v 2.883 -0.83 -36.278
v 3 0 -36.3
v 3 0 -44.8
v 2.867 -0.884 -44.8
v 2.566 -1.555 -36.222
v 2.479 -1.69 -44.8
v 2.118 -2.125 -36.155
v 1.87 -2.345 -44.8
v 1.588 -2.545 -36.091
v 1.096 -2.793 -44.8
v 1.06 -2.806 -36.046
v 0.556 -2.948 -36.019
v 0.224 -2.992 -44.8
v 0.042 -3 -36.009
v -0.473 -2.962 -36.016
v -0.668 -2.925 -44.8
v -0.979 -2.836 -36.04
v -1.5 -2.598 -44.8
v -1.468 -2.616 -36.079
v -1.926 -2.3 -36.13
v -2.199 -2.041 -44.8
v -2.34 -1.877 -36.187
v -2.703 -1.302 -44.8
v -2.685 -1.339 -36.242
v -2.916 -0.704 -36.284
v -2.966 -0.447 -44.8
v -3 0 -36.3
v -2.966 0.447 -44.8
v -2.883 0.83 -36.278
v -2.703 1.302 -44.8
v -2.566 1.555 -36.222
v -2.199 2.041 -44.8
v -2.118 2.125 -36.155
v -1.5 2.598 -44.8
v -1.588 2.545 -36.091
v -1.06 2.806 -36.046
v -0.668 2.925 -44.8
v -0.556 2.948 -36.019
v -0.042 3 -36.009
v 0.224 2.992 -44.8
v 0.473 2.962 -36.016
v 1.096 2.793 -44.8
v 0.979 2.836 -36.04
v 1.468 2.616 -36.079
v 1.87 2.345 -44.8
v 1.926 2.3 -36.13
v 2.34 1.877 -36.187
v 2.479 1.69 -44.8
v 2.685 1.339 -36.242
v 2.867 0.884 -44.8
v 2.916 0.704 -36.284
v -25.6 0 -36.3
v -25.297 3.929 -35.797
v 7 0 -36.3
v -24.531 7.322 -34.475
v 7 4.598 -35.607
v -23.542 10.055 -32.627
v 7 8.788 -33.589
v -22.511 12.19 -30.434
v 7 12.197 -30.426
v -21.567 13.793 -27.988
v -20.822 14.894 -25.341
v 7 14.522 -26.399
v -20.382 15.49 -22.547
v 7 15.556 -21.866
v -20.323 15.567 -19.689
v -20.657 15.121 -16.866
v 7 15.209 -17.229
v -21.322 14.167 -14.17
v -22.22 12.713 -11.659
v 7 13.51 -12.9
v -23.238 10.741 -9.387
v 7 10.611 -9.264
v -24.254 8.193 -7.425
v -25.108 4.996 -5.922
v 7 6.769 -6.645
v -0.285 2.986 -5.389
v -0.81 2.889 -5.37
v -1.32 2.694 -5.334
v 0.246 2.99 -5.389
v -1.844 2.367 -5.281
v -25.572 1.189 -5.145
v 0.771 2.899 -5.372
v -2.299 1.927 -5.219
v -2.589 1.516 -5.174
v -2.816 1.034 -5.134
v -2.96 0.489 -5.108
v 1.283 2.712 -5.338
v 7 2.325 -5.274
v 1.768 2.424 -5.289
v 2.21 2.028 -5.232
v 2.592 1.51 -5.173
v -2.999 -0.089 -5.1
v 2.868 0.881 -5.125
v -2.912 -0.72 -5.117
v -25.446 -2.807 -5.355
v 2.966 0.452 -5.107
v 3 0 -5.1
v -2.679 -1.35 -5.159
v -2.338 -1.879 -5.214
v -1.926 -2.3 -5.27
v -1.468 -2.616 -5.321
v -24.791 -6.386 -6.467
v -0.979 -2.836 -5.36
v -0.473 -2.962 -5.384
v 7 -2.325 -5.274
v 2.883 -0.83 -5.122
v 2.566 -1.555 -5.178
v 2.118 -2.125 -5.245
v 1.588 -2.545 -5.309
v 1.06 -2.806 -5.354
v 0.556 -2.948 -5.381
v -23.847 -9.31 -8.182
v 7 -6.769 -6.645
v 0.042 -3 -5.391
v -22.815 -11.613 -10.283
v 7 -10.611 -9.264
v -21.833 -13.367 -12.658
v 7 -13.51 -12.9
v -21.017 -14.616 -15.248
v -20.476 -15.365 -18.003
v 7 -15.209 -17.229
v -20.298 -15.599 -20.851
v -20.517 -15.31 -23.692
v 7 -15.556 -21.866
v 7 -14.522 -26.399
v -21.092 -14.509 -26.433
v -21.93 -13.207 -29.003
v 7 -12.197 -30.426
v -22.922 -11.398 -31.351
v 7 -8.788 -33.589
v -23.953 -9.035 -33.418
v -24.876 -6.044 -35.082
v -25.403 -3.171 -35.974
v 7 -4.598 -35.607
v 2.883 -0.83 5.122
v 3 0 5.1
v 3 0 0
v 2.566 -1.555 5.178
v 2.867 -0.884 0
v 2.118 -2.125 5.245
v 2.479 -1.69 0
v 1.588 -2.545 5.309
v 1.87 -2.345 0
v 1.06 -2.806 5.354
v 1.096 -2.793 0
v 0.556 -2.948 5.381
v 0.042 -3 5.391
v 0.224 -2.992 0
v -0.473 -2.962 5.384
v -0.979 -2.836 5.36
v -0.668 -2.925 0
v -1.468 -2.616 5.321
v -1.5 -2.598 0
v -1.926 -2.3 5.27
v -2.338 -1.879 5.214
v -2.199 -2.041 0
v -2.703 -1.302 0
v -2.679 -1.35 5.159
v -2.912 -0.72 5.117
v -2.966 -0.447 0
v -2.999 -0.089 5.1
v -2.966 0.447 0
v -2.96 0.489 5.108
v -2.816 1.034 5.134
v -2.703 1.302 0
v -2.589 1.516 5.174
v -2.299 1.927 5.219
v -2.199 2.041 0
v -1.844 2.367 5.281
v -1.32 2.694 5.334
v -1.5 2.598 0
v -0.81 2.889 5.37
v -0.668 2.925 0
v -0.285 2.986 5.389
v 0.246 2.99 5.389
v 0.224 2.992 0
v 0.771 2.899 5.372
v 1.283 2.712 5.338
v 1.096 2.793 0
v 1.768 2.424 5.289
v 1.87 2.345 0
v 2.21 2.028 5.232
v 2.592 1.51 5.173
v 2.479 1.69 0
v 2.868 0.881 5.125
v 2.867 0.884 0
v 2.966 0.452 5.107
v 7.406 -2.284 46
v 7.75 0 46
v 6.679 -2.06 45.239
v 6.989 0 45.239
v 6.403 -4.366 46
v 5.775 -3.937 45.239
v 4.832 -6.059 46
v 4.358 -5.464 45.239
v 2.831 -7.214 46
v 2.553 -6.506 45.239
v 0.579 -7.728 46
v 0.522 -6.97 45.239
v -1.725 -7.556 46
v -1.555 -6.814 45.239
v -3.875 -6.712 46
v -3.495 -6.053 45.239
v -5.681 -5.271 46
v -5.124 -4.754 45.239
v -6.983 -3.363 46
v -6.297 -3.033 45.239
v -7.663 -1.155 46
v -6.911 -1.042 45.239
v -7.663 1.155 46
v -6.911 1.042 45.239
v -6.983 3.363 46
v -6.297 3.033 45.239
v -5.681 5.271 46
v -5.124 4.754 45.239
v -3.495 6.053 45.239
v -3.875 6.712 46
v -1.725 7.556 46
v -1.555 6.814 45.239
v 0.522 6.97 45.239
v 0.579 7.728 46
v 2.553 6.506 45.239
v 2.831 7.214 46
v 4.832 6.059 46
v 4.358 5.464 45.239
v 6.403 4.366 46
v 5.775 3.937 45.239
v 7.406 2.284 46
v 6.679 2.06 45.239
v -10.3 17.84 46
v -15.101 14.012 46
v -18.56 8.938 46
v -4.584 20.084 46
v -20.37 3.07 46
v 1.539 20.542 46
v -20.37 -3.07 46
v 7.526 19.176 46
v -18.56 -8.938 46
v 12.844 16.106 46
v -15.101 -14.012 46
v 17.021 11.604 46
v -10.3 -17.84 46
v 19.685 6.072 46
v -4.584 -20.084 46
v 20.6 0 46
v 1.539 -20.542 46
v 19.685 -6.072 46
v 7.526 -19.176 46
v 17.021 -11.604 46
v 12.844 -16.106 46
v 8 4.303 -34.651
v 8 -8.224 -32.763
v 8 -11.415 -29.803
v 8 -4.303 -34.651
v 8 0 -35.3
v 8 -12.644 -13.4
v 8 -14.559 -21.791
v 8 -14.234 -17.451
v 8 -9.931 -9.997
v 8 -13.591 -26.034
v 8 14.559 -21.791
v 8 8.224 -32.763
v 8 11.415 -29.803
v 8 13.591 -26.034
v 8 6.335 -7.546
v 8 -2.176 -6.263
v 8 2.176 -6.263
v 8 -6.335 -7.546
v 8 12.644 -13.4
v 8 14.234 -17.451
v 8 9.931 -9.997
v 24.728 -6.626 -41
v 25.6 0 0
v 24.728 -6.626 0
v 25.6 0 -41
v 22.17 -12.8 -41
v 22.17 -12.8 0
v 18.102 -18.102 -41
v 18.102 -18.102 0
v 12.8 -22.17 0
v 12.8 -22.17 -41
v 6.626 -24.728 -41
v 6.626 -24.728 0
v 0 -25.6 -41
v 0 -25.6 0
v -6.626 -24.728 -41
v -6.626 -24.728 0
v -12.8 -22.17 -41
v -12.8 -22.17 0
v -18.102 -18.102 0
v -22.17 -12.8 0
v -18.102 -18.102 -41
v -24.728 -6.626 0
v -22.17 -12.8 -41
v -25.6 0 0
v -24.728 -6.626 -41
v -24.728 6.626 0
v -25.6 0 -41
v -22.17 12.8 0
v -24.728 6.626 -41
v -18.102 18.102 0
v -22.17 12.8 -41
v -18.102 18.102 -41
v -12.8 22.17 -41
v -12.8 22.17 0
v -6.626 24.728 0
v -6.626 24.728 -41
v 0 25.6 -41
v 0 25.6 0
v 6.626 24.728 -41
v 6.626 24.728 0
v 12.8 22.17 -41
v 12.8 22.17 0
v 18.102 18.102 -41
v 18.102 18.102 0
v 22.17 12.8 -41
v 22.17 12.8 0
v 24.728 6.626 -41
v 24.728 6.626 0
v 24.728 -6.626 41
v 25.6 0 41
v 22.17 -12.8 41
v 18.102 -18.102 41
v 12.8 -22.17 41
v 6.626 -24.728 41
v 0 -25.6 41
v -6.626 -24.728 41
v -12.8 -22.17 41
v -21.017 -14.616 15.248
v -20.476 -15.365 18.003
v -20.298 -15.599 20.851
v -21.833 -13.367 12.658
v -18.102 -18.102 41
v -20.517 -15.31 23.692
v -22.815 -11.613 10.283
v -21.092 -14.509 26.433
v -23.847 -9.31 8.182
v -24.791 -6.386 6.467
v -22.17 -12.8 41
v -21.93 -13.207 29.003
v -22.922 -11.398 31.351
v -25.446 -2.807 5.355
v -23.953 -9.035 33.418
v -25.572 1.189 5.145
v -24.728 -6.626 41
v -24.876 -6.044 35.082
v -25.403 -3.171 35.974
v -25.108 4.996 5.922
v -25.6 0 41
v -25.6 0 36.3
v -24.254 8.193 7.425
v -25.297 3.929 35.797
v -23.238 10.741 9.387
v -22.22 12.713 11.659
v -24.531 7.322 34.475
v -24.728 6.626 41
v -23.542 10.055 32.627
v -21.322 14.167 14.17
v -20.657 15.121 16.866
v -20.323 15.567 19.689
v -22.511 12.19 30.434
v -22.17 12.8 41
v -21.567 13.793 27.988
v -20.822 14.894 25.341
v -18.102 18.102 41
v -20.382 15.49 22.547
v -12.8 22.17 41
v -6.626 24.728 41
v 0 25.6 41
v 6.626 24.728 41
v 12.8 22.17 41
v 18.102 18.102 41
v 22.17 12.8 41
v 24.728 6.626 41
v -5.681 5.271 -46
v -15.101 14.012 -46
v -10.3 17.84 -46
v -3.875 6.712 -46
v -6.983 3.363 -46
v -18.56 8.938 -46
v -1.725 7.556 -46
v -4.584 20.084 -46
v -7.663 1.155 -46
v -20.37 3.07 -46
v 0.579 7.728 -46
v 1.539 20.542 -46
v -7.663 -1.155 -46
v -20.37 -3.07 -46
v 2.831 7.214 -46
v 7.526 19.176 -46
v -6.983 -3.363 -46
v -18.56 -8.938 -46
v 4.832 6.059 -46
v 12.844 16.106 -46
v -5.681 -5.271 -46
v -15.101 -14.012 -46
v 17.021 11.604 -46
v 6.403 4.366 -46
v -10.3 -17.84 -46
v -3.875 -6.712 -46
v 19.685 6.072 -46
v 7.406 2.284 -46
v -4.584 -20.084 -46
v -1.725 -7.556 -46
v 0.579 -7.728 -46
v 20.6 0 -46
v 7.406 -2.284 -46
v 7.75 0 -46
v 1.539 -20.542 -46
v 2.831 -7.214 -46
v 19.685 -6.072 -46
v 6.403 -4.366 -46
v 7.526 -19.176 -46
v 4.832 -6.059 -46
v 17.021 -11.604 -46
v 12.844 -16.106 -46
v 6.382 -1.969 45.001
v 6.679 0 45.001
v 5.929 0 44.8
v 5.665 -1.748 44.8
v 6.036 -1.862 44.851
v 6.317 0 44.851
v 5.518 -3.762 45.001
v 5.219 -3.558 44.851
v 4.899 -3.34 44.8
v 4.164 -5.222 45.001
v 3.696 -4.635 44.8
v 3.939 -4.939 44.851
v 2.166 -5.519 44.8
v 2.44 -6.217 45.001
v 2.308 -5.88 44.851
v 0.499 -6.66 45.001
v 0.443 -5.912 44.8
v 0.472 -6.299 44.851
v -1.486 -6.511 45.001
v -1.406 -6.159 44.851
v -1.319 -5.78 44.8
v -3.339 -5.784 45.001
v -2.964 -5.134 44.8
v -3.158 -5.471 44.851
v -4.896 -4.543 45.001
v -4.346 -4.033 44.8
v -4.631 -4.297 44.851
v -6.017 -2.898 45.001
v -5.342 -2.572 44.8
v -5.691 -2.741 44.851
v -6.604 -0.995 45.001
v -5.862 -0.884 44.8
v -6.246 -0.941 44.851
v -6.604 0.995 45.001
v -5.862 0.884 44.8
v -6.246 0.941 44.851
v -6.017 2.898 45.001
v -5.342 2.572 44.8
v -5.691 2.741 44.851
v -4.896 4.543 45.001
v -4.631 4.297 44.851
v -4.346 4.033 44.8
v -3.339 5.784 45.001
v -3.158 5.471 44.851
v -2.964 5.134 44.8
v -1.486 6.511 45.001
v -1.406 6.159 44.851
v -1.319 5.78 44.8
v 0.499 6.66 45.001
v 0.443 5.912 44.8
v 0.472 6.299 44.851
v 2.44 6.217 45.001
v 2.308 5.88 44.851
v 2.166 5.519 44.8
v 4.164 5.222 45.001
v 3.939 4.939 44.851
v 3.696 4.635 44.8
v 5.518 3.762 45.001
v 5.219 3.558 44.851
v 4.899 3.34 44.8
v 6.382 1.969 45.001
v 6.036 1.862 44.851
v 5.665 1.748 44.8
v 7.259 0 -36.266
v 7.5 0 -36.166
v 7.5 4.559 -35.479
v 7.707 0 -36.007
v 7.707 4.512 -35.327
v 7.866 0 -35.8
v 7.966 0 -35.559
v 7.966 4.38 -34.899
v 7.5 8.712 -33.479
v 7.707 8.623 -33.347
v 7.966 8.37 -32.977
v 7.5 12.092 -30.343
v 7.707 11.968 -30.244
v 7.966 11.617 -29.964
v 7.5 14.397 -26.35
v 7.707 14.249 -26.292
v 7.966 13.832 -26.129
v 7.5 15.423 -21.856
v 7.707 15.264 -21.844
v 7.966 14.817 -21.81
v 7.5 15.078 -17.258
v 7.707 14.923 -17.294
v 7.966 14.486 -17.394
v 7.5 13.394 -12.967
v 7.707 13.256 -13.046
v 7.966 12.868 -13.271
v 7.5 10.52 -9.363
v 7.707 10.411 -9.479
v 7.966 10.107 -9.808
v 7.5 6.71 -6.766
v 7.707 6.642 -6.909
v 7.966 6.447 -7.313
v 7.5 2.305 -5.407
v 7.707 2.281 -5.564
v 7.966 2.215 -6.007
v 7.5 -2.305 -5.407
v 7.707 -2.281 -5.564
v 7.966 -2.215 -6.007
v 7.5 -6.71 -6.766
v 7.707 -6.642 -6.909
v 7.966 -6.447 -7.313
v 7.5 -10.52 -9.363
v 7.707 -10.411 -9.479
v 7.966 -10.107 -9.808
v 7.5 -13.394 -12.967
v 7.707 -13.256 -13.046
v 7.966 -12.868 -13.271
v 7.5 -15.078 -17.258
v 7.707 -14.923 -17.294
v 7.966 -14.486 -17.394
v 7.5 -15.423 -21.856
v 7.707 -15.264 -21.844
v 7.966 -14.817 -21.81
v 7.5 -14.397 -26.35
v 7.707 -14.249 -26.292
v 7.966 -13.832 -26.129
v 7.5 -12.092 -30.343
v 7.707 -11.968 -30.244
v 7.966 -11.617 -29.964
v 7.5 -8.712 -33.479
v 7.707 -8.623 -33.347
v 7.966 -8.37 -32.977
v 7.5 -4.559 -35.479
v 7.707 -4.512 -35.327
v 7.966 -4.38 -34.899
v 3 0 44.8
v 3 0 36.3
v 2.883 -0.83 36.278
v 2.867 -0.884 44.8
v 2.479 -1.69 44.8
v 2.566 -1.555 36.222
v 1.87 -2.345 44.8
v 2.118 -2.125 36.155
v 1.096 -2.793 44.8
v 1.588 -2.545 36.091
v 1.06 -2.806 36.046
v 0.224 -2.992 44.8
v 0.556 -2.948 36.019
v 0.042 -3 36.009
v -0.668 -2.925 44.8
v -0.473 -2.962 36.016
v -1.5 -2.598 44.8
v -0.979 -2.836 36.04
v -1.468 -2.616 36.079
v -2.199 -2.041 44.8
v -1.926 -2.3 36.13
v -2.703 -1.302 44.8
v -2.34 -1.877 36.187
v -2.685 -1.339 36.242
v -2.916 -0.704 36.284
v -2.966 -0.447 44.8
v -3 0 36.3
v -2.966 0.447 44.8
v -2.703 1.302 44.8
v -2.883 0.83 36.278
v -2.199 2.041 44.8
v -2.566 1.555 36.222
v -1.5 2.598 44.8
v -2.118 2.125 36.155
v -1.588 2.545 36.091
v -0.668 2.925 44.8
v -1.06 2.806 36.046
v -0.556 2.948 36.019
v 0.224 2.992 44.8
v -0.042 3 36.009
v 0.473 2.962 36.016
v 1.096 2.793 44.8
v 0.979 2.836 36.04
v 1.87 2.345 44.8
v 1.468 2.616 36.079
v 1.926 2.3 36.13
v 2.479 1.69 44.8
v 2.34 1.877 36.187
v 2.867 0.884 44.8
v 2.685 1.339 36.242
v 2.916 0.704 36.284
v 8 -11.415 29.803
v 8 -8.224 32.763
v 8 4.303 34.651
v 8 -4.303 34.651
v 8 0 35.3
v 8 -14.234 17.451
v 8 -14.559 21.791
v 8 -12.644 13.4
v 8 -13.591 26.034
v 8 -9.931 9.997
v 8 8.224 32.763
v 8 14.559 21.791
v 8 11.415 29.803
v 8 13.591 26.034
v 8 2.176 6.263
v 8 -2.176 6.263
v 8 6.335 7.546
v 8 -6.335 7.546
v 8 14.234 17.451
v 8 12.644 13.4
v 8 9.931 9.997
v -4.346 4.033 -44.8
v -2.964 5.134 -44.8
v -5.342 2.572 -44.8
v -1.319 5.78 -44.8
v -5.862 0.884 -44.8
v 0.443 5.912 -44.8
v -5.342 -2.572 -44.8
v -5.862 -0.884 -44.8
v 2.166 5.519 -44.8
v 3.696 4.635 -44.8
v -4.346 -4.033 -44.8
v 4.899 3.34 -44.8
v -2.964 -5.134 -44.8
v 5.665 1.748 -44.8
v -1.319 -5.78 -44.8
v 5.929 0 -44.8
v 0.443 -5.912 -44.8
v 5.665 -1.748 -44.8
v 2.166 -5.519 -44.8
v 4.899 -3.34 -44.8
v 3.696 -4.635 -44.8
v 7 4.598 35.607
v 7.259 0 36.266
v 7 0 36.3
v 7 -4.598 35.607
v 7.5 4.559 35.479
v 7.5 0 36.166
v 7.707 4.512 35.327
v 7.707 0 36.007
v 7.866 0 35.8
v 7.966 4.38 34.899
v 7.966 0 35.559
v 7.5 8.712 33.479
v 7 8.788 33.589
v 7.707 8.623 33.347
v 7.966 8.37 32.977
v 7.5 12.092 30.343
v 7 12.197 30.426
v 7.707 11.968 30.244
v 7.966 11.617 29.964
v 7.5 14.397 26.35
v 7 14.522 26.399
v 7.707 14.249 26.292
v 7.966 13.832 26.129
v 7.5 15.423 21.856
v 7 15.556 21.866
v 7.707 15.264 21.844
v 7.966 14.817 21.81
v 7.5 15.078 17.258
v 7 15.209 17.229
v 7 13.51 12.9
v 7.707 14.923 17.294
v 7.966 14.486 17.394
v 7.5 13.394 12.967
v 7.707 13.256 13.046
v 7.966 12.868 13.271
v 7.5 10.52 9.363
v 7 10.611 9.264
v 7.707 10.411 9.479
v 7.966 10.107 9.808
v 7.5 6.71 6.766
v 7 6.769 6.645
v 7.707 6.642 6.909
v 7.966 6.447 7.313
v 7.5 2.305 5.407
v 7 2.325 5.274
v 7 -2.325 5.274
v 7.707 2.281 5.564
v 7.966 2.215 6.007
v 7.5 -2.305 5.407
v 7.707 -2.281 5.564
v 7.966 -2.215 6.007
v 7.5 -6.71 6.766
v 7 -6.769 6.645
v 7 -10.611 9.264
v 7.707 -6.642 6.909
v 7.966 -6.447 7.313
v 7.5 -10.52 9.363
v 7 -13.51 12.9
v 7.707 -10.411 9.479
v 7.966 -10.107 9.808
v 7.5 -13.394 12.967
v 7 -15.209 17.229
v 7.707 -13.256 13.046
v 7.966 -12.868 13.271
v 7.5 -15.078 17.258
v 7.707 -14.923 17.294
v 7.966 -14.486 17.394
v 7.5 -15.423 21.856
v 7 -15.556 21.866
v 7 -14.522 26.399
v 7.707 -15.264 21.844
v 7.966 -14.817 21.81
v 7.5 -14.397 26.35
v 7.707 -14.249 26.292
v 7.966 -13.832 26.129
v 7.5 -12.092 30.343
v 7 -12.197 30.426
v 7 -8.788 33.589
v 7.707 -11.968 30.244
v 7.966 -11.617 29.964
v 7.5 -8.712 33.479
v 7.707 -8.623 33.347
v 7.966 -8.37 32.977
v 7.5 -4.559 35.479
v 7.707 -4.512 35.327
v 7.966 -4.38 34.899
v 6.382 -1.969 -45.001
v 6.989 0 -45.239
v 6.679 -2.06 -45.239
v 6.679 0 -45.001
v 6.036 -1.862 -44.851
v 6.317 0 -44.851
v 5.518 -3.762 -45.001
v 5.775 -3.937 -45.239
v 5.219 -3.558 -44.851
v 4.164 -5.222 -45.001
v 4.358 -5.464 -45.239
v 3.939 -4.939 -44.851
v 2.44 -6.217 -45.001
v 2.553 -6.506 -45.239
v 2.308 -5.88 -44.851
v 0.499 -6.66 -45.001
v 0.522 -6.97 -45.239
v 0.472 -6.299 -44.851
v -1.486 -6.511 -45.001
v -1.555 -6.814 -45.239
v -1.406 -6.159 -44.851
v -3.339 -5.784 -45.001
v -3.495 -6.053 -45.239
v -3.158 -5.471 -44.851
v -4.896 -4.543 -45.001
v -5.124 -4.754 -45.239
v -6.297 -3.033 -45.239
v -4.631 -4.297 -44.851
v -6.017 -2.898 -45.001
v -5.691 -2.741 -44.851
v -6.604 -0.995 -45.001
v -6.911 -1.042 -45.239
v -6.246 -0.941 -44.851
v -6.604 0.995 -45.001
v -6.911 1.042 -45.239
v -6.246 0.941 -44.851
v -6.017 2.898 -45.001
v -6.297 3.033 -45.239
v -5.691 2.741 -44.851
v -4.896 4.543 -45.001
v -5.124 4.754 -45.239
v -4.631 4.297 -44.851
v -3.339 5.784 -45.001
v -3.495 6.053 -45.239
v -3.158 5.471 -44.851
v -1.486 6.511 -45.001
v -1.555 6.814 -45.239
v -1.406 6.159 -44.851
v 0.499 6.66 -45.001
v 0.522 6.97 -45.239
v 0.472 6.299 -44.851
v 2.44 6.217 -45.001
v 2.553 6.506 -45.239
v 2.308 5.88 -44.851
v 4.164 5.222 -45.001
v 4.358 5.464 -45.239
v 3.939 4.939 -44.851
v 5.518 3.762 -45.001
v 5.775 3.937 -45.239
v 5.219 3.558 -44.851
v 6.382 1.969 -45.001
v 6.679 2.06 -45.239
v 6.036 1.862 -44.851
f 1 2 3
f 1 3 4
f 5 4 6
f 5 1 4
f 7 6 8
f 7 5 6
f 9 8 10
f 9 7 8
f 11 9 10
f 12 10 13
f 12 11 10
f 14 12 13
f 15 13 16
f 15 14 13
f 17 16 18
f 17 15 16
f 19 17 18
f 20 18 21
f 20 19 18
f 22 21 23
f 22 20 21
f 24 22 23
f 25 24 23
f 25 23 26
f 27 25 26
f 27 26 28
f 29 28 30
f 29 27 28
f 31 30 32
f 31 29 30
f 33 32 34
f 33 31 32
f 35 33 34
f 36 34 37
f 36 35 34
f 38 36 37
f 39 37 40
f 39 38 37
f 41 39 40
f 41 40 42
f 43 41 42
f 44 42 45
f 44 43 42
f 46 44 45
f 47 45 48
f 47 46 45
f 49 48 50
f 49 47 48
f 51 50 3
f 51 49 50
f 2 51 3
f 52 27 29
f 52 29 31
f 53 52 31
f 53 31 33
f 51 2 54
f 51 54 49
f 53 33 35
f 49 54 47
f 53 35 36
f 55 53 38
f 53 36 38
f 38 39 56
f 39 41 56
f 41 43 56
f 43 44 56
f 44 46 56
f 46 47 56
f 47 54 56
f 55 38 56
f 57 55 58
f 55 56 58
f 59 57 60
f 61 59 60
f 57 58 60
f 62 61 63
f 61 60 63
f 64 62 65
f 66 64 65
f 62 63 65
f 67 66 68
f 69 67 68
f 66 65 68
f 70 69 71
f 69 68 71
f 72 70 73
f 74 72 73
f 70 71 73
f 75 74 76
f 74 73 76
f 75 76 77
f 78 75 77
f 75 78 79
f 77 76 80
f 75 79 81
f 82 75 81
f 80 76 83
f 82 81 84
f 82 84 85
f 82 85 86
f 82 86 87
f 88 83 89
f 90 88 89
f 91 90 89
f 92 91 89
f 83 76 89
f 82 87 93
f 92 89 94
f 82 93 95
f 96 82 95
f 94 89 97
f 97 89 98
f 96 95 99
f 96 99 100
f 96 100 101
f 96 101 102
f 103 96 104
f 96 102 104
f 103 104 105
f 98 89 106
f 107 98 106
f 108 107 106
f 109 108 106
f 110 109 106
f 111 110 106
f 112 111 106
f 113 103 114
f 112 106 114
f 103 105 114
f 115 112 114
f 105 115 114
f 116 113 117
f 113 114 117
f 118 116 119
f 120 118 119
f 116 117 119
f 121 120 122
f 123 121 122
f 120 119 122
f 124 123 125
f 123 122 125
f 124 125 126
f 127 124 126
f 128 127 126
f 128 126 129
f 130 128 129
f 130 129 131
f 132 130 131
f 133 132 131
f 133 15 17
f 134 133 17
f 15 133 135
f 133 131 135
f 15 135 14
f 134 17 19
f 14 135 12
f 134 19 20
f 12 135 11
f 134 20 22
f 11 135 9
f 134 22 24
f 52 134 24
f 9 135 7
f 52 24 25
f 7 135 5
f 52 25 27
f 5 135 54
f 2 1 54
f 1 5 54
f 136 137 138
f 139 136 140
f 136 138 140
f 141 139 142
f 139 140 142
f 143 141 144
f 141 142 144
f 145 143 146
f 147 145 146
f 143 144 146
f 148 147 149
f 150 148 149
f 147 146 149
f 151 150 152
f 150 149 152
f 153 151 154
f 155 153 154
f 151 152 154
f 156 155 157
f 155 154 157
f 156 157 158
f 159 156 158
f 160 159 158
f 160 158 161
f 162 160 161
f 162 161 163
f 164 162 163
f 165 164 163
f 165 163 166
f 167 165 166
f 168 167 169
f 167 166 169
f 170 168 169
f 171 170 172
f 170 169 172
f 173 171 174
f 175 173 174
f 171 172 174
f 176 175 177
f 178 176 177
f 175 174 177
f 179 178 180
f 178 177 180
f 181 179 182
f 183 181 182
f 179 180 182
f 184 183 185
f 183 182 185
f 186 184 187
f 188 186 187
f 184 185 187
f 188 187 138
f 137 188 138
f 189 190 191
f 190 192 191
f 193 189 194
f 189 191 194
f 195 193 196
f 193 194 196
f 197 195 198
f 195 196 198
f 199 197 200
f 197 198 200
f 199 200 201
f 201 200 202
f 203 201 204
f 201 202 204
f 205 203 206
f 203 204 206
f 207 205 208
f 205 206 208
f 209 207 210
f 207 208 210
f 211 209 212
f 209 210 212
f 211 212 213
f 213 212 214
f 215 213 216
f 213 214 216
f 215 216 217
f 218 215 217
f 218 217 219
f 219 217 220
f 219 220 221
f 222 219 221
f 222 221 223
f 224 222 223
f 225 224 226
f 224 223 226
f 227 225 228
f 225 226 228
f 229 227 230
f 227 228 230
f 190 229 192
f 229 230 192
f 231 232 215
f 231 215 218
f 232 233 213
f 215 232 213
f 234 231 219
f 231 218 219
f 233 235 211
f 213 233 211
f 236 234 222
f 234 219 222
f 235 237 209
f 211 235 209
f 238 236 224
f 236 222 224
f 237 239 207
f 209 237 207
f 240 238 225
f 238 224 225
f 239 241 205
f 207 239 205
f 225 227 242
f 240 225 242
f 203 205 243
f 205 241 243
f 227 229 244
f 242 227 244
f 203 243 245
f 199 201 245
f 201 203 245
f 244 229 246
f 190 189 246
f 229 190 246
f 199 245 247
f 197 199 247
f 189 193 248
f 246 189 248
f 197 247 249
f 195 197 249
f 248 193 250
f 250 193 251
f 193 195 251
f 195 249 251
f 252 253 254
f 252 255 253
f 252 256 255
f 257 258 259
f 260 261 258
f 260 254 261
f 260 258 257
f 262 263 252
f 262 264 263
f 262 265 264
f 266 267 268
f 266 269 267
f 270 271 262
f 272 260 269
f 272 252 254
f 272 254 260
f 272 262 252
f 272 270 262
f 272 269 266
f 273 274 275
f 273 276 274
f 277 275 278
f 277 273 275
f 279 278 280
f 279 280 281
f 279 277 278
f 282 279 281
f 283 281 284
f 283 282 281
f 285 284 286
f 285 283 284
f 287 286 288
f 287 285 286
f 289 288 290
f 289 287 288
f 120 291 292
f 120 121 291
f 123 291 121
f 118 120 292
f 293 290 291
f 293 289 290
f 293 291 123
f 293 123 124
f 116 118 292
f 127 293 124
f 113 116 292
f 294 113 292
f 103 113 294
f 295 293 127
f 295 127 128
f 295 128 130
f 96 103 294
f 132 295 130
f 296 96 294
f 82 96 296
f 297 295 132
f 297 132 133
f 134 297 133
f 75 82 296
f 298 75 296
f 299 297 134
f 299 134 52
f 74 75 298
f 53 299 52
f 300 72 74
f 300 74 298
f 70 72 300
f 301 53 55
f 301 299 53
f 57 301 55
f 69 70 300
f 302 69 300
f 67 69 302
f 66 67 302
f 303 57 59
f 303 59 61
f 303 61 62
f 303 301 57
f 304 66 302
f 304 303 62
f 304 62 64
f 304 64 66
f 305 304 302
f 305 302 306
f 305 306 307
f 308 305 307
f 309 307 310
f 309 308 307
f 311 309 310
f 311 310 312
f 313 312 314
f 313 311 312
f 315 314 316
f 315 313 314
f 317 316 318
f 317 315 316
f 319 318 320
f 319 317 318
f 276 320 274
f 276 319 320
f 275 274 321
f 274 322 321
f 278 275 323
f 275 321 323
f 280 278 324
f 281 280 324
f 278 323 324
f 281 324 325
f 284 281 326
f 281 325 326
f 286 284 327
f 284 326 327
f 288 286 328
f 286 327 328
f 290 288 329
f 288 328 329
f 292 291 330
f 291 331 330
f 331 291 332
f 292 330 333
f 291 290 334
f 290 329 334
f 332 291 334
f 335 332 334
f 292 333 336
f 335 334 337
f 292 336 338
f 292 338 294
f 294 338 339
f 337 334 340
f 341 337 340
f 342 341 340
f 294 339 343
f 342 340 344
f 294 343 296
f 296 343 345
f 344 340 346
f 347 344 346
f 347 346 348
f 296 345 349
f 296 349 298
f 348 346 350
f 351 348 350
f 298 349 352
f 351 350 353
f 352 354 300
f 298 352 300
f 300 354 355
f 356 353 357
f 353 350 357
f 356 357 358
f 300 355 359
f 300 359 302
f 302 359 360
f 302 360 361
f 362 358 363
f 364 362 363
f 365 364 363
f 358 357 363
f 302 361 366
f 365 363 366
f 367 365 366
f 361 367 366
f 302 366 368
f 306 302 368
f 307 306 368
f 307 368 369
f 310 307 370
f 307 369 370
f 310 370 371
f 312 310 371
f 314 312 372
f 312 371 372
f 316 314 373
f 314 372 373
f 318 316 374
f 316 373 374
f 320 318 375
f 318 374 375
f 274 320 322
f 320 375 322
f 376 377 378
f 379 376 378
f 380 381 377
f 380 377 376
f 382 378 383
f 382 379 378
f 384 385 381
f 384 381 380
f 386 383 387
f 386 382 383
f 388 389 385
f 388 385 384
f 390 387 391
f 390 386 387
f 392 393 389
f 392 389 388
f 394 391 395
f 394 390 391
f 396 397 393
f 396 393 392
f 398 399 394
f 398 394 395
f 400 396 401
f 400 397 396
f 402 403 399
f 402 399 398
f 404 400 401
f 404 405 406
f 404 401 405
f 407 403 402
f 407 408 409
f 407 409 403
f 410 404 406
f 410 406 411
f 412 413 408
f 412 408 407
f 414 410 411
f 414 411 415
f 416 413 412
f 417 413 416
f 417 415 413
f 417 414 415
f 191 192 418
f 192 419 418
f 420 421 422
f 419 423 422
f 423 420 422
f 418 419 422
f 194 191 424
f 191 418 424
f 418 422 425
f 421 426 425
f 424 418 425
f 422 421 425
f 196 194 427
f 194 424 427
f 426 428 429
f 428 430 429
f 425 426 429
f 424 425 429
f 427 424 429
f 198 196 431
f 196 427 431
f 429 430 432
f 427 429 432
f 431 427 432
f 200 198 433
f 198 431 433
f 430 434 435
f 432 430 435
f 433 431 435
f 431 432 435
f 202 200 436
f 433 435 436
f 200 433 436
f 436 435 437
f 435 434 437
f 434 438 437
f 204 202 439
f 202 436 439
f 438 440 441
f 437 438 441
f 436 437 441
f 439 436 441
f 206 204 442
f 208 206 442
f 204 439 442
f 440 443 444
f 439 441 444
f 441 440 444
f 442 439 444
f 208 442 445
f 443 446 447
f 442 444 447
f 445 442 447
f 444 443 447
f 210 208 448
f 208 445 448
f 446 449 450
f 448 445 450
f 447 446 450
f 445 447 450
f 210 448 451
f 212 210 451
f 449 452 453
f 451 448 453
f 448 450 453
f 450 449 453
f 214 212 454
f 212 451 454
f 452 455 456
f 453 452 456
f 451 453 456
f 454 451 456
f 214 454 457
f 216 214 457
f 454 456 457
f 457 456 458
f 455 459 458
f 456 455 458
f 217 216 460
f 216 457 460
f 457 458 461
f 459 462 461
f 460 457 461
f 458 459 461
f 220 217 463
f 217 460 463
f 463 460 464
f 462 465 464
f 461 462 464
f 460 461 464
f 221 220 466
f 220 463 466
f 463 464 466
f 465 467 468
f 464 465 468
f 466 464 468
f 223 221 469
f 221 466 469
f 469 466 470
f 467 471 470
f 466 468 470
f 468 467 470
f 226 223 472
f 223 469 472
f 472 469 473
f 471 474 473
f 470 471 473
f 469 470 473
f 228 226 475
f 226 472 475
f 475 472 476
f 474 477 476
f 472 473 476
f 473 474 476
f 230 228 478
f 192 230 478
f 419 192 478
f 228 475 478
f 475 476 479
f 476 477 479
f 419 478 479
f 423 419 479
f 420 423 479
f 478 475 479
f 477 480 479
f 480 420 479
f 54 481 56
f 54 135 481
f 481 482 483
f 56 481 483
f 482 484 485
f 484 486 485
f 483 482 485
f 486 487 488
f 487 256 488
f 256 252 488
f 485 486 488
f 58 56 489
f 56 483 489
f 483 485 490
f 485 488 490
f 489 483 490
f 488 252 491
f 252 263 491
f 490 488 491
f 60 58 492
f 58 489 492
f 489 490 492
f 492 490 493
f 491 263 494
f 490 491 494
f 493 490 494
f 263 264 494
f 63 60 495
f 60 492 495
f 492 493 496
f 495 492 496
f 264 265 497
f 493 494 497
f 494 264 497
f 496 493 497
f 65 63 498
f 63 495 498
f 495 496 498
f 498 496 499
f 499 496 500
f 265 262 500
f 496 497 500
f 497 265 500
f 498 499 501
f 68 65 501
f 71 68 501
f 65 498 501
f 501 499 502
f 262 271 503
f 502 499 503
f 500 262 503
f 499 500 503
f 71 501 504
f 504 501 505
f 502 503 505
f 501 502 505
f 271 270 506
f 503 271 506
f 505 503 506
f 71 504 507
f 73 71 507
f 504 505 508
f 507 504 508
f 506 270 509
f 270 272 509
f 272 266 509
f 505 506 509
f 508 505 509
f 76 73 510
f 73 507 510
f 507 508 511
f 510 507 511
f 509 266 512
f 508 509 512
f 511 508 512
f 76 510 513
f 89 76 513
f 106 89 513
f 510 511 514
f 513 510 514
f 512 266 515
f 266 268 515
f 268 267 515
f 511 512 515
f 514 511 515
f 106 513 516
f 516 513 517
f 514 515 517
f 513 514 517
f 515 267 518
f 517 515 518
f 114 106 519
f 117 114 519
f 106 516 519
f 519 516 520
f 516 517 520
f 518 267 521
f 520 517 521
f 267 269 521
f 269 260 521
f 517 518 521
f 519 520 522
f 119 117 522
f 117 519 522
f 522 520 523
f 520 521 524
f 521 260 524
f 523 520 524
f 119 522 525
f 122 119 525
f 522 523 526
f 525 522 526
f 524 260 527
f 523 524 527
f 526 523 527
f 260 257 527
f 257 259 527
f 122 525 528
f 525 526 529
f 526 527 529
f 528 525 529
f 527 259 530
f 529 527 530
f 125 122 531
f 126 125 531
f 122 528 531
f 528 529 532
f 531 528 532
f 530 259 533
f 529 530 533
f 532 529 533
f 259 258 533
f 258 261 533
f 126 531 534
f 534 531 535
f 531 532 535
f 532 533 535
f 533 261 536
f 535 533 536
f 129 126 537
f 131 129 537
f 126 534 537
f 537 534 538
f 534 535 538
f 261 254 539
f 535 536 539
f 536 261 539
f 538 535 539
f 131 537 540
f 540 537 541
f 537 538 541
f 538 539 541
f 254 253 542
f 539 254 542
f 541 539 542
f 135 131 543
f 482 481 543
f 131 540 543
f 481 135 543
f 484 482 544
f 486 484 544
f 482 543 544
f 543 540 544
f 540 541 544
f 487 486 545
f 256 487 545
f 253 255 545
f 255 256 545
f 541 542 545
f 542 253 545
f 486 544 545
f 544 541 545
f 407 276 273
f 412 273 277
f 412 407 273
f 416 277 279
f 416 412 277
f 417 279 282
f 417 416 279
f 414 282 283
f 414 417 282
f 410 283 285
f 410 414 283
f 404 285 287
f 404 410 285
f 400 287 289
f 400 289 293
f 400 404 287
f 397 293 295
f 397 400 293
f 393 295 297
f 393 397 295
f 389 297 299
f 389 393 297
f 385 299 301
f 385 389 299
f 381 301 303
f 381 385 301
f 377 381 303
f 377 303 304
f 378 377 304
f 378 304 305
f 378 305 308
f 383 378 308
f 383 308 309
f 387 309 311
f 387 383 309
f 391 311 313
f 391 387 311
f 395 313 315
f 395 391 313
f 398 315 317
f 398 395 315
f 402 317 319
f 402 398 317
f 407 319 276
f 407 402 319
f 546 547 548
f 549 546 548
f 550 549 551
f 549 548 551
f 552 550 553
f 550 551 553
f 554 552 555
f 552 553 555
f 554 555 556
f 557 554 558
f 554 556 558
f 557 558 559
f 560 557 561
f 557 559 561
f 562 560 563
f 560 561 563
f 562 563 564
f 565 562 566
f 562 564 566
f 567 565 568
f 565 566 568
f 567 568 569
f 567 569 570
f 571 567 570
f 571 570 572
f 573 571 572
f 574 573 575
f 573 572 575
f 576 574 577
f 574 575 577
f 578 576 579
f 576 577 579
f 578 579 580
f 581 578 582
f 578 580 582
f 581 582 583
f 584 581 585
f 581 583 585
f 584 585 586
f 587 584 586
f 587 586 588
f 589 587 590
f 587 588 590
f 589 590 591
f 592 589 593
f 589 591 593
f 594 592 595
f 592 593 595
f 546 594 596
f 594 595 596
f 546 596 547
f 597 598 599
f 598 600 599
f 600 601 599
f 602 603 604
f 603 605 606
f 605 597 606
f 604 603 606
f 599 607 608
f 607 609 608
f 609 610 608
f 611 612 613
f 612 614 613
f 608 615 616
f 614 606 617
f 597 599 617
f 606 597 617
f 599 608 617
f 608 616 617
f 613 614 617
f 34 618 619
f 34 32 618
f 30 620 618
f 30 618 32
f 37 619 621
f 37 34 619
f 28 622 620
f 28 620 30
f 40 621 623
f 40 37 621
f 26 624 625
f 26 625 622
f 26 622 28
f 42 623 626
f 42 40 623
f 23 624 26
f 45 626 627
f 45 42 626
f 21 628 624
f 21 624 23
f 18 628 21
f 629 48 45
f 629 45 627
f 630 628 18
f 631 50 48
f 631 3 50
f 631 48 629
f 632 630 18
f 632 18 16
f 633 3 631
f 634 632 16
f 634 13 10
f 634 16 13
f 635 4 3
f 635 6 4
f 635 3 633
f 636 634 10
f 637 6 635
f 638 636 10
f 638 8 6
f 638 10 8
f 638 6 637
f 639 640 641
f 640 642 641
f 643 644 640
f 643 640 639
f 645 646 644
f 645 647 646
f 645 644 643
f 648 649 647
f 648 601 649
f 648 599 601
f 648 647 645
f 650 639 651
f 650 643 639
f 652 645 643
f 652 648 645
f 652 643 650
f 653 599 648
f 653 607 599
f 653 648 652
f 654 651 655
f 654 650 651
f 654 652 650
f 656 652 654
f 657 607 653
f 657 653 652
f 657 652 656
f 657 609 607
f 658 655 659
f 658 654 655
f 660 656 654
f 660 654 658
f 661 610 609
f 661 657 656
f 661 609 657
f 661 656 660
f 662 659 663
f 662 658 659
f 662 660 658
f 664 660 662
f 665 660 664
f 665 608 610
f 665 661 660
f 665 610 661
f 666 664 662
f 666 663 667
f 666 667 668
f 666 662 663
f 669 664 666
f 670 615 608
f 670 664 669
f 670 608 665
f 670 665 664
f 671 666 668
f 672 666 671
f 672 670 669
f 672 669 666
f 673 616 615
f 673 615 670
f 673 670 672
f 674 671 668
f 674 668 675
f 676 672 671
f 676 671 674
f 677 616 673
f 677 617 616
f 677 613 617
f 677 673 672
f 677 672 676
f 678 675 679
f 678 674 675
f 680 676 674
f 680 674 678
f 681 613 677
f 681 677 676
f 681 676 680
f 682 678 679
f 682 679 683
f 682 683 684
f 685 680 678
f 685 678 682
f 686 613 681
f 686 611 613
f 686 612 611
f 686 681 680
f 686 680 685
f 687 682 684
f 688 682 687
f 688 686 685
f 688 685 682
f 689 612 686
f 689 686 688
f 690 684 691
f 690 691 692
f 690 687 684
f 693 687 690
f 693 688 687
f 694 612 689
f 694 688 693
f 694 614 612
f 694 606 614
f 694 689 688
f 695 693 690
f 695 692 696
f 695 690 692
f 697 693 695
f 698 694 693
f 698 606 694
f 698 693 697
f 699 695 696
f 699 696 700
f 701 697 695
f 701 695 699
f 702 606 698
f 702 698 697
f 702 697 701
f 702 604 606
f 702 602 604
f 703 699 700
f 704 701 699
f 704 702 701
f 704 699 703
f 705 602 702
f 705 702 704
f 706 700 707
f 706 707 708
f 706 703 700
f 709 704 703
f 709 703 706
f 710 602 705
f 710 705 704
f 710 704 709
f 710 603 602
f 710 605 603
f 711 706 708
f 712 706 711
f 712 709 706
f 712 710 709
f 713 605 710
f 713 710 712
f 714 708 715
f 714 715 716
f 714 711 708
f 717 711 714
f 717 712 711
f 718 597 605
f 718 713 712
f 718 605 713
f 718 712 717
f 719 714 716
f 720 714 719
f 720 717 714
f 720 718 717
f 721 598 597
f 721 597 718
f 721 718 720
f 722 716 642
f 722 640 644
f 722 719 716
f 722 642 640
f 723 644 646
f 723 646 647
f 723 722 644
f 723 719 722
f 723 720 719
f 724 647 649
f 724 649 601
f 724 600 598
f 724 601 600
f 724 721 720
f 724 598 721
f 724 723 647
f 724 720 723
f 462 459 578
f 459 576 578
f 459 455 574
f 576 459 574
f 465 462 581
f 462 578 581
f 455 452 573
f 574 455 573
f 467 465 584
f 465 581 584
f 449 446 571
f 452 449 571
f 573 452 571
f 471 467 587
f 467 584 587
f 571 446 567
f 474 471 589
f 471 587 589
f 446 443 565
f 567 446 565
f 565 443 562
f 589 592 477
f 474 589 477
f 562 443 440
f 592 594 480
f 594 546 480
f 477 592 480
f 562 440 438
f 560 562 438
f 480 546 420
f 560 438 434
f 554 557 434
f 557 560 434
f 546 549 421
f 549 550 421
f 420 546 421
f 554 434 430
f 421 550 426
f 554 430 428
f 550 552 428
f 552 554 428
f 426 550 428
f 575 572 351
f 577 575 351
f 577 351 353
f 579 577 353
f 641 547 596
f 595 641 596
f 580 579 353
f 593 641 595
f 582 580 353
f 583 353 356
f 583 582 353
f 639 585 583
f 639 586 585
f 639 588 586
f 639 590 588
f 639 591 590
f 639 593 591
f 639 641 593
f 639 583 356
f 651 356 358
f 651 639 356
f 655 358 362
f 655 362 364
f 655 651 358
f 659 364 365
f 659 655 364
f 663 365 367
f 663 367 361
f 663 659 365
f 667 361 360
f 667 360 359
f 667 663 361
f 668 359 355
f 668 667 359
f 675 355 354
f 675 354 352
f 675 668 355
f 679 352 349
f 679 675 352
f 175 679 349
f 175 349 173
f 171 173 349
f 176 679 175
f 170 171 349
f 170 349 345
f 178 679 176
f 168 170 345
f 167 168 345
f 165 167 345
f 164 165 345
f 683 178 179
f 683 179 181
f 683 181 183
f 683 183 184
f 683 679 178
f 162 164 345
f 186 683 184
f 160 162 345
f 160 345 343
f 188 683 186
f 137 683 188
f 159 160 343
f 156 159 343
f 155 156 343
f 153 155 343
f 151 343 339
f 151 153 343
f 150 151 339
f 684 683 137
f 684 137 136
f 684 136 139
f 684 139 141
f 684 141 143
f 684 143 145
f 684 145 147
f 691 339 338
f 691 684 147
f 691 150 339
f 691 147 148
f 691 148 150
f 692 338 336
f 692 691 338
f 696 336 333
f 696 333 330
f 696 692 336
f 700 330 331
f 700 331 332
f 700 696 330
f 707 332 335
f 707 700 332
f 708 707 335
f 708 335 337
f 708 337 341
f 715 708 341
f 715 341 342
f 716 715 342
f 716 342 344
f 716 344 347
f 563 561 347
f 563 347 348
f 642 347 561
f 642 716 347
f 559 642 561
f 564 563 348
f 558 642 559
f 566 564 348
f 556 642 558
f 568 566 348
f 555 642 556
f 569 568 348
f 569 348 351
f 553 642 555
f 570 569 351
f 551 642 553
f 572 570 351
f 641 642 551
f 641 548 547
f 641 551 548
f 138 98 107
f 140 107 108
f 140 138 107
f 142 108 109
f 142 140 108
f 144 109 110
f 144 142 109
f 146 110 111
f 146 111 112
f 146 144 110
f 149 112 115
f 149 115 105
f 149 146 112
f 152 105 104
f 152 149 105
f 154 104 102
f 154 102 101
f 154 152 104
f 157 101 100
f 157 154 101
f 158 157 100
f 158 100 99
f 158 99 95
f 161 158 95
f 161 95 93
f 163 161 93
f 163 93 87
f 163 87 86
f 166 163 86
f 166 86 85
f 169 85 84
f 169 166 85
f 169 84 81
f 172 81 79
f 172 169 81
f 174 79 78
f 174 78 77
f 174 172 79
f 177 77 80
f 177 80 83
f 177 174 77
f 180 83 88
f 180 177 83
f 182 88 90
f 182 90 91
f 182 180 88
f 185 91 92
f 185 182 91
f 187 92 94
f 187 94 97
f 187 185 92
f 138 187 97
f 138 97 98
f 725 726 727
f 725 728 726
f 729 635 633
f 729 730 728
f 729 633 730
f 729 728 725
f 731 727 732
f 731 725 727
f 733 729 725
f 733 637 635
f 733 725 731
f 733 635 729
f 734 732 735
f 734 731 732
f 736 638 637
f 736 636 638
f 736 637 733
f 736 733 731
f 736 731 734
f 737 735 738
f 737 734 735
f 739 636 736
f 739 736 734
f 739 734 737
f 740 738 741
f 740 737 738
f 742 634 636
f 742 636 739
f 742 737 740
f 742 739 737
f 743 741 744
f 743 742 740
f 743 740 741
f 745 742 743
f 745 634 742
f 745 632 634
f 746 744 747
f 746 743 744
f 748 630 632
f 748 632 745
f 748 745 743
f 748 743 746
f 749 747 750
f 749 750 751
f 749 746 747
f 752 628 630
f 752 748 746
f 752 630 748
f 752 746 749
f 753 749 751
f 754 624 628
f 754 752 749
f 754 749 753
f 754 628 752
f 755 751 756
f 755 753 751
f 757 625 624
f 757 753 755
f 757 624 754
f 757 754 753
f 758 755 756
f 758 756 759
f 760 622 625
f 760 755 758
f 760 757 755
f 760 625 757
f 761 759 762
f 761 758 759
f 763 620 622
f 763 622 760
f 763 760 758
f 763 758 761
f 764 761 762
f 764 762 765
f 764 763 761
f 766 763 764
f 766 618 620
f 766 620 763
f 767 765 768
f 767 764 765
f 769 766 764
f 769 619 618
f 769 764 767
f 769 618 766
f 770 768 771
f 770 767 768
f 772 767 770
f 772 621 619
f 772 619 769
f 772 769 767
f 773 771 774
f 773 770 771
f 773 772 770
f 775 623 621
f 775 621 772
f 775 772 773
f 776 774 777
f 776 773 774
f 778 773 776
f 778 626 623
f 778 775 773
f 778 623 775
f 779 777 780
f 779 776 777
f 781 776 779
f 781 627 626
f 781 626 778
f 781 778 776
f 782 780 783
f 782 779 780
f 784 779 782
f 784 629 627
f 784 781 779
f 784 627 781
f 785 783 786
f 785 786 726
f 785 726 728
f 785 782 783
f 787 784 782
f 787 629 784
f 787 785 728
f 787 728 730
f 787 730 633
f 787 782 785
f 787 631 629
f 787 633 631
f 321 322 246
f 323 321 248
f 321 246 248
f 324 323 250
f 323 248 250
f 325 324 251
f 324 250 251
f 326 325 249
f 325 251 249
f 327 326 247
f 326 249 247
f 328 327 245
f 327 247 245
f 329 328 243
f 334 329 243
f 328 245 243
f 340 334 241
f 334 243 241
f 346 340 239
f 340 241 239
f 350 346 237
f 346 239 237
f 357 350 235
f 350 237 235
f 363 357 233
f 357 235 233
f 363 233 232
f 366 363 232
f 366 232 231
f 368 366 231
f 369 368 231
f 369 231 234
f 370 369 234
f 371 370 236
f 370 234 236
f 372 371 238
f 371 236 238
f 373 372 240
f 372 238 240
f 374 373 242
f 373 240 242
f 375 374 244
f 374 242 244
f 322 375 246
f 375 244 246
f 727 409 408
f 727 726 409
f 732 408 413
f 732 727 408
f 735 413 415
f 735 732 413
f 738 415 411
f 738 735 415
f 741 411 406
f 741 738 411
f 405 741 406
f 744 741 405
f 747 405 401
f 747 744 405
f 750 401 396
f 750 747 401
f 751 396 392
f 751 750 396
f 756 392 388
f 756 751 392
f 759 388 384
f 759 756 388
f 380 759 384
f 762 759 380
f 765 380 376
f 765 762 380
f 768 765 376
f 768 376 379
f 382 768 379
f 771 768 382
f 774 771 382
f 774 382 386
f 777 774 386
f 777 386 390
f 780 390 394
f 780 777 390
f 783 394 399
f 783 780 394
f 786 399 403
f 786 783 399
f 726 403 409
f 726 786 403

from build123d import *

# Parameters (mm, degrees)
F2_W = 33.6
F2_H = 15.6
F4_R = 1


with BuildPart() as f1:
    # F0 (on Front) → F1 (revolve)
    with BuildSketch(Plane.XZ):
        with BuildLine():
            Line((3, 44.8), (3, 0))
            Line((3, 0), (25.6, 0))
            Line((25.6, 0), (25.6, 41))
            Line((25.6, 41), (20.6, 46))
            Line((20.6, 46), (7.75, 46))
            Line((7.75, 46), (6.9893398282, 45.2393398282))
            ThreePointArc((6.9893398282, 45.2393398282), (6.502704805, 44.9141807012), (5.9286796564, 44.8))
            Line((5.9286796564, 44.8), (3, 44.8))
        make_face()
    revolve(axis=Axis((0, 0, -6.1797830276), (0, 0, -1)))

    # F2 (on Front) → F3 (revolve, cut)
    with BuildSketch(Plane.XZ):
        with Locations((-8.8, 28.5)):
            Rectangle(F2_W, F2_H)
    revolve(axis=Axis((-34.5689574801, 0, 20.7), (-1, 0, 0)), mode=Mode.SUBTRACT)

    # F4
    f4_edges = [f1.edges().sort_by_distance(p)[0] for p in [
        (8, 0, 5.1),
    ]]
    fillet(f4_edges, radius=F4_R)

    # F5: F1 across plane


with BuildPart() as f1_1:
    add(f1.part)
    add(f1.part.mirror(Plane.XY))


solid = f1_1.part
